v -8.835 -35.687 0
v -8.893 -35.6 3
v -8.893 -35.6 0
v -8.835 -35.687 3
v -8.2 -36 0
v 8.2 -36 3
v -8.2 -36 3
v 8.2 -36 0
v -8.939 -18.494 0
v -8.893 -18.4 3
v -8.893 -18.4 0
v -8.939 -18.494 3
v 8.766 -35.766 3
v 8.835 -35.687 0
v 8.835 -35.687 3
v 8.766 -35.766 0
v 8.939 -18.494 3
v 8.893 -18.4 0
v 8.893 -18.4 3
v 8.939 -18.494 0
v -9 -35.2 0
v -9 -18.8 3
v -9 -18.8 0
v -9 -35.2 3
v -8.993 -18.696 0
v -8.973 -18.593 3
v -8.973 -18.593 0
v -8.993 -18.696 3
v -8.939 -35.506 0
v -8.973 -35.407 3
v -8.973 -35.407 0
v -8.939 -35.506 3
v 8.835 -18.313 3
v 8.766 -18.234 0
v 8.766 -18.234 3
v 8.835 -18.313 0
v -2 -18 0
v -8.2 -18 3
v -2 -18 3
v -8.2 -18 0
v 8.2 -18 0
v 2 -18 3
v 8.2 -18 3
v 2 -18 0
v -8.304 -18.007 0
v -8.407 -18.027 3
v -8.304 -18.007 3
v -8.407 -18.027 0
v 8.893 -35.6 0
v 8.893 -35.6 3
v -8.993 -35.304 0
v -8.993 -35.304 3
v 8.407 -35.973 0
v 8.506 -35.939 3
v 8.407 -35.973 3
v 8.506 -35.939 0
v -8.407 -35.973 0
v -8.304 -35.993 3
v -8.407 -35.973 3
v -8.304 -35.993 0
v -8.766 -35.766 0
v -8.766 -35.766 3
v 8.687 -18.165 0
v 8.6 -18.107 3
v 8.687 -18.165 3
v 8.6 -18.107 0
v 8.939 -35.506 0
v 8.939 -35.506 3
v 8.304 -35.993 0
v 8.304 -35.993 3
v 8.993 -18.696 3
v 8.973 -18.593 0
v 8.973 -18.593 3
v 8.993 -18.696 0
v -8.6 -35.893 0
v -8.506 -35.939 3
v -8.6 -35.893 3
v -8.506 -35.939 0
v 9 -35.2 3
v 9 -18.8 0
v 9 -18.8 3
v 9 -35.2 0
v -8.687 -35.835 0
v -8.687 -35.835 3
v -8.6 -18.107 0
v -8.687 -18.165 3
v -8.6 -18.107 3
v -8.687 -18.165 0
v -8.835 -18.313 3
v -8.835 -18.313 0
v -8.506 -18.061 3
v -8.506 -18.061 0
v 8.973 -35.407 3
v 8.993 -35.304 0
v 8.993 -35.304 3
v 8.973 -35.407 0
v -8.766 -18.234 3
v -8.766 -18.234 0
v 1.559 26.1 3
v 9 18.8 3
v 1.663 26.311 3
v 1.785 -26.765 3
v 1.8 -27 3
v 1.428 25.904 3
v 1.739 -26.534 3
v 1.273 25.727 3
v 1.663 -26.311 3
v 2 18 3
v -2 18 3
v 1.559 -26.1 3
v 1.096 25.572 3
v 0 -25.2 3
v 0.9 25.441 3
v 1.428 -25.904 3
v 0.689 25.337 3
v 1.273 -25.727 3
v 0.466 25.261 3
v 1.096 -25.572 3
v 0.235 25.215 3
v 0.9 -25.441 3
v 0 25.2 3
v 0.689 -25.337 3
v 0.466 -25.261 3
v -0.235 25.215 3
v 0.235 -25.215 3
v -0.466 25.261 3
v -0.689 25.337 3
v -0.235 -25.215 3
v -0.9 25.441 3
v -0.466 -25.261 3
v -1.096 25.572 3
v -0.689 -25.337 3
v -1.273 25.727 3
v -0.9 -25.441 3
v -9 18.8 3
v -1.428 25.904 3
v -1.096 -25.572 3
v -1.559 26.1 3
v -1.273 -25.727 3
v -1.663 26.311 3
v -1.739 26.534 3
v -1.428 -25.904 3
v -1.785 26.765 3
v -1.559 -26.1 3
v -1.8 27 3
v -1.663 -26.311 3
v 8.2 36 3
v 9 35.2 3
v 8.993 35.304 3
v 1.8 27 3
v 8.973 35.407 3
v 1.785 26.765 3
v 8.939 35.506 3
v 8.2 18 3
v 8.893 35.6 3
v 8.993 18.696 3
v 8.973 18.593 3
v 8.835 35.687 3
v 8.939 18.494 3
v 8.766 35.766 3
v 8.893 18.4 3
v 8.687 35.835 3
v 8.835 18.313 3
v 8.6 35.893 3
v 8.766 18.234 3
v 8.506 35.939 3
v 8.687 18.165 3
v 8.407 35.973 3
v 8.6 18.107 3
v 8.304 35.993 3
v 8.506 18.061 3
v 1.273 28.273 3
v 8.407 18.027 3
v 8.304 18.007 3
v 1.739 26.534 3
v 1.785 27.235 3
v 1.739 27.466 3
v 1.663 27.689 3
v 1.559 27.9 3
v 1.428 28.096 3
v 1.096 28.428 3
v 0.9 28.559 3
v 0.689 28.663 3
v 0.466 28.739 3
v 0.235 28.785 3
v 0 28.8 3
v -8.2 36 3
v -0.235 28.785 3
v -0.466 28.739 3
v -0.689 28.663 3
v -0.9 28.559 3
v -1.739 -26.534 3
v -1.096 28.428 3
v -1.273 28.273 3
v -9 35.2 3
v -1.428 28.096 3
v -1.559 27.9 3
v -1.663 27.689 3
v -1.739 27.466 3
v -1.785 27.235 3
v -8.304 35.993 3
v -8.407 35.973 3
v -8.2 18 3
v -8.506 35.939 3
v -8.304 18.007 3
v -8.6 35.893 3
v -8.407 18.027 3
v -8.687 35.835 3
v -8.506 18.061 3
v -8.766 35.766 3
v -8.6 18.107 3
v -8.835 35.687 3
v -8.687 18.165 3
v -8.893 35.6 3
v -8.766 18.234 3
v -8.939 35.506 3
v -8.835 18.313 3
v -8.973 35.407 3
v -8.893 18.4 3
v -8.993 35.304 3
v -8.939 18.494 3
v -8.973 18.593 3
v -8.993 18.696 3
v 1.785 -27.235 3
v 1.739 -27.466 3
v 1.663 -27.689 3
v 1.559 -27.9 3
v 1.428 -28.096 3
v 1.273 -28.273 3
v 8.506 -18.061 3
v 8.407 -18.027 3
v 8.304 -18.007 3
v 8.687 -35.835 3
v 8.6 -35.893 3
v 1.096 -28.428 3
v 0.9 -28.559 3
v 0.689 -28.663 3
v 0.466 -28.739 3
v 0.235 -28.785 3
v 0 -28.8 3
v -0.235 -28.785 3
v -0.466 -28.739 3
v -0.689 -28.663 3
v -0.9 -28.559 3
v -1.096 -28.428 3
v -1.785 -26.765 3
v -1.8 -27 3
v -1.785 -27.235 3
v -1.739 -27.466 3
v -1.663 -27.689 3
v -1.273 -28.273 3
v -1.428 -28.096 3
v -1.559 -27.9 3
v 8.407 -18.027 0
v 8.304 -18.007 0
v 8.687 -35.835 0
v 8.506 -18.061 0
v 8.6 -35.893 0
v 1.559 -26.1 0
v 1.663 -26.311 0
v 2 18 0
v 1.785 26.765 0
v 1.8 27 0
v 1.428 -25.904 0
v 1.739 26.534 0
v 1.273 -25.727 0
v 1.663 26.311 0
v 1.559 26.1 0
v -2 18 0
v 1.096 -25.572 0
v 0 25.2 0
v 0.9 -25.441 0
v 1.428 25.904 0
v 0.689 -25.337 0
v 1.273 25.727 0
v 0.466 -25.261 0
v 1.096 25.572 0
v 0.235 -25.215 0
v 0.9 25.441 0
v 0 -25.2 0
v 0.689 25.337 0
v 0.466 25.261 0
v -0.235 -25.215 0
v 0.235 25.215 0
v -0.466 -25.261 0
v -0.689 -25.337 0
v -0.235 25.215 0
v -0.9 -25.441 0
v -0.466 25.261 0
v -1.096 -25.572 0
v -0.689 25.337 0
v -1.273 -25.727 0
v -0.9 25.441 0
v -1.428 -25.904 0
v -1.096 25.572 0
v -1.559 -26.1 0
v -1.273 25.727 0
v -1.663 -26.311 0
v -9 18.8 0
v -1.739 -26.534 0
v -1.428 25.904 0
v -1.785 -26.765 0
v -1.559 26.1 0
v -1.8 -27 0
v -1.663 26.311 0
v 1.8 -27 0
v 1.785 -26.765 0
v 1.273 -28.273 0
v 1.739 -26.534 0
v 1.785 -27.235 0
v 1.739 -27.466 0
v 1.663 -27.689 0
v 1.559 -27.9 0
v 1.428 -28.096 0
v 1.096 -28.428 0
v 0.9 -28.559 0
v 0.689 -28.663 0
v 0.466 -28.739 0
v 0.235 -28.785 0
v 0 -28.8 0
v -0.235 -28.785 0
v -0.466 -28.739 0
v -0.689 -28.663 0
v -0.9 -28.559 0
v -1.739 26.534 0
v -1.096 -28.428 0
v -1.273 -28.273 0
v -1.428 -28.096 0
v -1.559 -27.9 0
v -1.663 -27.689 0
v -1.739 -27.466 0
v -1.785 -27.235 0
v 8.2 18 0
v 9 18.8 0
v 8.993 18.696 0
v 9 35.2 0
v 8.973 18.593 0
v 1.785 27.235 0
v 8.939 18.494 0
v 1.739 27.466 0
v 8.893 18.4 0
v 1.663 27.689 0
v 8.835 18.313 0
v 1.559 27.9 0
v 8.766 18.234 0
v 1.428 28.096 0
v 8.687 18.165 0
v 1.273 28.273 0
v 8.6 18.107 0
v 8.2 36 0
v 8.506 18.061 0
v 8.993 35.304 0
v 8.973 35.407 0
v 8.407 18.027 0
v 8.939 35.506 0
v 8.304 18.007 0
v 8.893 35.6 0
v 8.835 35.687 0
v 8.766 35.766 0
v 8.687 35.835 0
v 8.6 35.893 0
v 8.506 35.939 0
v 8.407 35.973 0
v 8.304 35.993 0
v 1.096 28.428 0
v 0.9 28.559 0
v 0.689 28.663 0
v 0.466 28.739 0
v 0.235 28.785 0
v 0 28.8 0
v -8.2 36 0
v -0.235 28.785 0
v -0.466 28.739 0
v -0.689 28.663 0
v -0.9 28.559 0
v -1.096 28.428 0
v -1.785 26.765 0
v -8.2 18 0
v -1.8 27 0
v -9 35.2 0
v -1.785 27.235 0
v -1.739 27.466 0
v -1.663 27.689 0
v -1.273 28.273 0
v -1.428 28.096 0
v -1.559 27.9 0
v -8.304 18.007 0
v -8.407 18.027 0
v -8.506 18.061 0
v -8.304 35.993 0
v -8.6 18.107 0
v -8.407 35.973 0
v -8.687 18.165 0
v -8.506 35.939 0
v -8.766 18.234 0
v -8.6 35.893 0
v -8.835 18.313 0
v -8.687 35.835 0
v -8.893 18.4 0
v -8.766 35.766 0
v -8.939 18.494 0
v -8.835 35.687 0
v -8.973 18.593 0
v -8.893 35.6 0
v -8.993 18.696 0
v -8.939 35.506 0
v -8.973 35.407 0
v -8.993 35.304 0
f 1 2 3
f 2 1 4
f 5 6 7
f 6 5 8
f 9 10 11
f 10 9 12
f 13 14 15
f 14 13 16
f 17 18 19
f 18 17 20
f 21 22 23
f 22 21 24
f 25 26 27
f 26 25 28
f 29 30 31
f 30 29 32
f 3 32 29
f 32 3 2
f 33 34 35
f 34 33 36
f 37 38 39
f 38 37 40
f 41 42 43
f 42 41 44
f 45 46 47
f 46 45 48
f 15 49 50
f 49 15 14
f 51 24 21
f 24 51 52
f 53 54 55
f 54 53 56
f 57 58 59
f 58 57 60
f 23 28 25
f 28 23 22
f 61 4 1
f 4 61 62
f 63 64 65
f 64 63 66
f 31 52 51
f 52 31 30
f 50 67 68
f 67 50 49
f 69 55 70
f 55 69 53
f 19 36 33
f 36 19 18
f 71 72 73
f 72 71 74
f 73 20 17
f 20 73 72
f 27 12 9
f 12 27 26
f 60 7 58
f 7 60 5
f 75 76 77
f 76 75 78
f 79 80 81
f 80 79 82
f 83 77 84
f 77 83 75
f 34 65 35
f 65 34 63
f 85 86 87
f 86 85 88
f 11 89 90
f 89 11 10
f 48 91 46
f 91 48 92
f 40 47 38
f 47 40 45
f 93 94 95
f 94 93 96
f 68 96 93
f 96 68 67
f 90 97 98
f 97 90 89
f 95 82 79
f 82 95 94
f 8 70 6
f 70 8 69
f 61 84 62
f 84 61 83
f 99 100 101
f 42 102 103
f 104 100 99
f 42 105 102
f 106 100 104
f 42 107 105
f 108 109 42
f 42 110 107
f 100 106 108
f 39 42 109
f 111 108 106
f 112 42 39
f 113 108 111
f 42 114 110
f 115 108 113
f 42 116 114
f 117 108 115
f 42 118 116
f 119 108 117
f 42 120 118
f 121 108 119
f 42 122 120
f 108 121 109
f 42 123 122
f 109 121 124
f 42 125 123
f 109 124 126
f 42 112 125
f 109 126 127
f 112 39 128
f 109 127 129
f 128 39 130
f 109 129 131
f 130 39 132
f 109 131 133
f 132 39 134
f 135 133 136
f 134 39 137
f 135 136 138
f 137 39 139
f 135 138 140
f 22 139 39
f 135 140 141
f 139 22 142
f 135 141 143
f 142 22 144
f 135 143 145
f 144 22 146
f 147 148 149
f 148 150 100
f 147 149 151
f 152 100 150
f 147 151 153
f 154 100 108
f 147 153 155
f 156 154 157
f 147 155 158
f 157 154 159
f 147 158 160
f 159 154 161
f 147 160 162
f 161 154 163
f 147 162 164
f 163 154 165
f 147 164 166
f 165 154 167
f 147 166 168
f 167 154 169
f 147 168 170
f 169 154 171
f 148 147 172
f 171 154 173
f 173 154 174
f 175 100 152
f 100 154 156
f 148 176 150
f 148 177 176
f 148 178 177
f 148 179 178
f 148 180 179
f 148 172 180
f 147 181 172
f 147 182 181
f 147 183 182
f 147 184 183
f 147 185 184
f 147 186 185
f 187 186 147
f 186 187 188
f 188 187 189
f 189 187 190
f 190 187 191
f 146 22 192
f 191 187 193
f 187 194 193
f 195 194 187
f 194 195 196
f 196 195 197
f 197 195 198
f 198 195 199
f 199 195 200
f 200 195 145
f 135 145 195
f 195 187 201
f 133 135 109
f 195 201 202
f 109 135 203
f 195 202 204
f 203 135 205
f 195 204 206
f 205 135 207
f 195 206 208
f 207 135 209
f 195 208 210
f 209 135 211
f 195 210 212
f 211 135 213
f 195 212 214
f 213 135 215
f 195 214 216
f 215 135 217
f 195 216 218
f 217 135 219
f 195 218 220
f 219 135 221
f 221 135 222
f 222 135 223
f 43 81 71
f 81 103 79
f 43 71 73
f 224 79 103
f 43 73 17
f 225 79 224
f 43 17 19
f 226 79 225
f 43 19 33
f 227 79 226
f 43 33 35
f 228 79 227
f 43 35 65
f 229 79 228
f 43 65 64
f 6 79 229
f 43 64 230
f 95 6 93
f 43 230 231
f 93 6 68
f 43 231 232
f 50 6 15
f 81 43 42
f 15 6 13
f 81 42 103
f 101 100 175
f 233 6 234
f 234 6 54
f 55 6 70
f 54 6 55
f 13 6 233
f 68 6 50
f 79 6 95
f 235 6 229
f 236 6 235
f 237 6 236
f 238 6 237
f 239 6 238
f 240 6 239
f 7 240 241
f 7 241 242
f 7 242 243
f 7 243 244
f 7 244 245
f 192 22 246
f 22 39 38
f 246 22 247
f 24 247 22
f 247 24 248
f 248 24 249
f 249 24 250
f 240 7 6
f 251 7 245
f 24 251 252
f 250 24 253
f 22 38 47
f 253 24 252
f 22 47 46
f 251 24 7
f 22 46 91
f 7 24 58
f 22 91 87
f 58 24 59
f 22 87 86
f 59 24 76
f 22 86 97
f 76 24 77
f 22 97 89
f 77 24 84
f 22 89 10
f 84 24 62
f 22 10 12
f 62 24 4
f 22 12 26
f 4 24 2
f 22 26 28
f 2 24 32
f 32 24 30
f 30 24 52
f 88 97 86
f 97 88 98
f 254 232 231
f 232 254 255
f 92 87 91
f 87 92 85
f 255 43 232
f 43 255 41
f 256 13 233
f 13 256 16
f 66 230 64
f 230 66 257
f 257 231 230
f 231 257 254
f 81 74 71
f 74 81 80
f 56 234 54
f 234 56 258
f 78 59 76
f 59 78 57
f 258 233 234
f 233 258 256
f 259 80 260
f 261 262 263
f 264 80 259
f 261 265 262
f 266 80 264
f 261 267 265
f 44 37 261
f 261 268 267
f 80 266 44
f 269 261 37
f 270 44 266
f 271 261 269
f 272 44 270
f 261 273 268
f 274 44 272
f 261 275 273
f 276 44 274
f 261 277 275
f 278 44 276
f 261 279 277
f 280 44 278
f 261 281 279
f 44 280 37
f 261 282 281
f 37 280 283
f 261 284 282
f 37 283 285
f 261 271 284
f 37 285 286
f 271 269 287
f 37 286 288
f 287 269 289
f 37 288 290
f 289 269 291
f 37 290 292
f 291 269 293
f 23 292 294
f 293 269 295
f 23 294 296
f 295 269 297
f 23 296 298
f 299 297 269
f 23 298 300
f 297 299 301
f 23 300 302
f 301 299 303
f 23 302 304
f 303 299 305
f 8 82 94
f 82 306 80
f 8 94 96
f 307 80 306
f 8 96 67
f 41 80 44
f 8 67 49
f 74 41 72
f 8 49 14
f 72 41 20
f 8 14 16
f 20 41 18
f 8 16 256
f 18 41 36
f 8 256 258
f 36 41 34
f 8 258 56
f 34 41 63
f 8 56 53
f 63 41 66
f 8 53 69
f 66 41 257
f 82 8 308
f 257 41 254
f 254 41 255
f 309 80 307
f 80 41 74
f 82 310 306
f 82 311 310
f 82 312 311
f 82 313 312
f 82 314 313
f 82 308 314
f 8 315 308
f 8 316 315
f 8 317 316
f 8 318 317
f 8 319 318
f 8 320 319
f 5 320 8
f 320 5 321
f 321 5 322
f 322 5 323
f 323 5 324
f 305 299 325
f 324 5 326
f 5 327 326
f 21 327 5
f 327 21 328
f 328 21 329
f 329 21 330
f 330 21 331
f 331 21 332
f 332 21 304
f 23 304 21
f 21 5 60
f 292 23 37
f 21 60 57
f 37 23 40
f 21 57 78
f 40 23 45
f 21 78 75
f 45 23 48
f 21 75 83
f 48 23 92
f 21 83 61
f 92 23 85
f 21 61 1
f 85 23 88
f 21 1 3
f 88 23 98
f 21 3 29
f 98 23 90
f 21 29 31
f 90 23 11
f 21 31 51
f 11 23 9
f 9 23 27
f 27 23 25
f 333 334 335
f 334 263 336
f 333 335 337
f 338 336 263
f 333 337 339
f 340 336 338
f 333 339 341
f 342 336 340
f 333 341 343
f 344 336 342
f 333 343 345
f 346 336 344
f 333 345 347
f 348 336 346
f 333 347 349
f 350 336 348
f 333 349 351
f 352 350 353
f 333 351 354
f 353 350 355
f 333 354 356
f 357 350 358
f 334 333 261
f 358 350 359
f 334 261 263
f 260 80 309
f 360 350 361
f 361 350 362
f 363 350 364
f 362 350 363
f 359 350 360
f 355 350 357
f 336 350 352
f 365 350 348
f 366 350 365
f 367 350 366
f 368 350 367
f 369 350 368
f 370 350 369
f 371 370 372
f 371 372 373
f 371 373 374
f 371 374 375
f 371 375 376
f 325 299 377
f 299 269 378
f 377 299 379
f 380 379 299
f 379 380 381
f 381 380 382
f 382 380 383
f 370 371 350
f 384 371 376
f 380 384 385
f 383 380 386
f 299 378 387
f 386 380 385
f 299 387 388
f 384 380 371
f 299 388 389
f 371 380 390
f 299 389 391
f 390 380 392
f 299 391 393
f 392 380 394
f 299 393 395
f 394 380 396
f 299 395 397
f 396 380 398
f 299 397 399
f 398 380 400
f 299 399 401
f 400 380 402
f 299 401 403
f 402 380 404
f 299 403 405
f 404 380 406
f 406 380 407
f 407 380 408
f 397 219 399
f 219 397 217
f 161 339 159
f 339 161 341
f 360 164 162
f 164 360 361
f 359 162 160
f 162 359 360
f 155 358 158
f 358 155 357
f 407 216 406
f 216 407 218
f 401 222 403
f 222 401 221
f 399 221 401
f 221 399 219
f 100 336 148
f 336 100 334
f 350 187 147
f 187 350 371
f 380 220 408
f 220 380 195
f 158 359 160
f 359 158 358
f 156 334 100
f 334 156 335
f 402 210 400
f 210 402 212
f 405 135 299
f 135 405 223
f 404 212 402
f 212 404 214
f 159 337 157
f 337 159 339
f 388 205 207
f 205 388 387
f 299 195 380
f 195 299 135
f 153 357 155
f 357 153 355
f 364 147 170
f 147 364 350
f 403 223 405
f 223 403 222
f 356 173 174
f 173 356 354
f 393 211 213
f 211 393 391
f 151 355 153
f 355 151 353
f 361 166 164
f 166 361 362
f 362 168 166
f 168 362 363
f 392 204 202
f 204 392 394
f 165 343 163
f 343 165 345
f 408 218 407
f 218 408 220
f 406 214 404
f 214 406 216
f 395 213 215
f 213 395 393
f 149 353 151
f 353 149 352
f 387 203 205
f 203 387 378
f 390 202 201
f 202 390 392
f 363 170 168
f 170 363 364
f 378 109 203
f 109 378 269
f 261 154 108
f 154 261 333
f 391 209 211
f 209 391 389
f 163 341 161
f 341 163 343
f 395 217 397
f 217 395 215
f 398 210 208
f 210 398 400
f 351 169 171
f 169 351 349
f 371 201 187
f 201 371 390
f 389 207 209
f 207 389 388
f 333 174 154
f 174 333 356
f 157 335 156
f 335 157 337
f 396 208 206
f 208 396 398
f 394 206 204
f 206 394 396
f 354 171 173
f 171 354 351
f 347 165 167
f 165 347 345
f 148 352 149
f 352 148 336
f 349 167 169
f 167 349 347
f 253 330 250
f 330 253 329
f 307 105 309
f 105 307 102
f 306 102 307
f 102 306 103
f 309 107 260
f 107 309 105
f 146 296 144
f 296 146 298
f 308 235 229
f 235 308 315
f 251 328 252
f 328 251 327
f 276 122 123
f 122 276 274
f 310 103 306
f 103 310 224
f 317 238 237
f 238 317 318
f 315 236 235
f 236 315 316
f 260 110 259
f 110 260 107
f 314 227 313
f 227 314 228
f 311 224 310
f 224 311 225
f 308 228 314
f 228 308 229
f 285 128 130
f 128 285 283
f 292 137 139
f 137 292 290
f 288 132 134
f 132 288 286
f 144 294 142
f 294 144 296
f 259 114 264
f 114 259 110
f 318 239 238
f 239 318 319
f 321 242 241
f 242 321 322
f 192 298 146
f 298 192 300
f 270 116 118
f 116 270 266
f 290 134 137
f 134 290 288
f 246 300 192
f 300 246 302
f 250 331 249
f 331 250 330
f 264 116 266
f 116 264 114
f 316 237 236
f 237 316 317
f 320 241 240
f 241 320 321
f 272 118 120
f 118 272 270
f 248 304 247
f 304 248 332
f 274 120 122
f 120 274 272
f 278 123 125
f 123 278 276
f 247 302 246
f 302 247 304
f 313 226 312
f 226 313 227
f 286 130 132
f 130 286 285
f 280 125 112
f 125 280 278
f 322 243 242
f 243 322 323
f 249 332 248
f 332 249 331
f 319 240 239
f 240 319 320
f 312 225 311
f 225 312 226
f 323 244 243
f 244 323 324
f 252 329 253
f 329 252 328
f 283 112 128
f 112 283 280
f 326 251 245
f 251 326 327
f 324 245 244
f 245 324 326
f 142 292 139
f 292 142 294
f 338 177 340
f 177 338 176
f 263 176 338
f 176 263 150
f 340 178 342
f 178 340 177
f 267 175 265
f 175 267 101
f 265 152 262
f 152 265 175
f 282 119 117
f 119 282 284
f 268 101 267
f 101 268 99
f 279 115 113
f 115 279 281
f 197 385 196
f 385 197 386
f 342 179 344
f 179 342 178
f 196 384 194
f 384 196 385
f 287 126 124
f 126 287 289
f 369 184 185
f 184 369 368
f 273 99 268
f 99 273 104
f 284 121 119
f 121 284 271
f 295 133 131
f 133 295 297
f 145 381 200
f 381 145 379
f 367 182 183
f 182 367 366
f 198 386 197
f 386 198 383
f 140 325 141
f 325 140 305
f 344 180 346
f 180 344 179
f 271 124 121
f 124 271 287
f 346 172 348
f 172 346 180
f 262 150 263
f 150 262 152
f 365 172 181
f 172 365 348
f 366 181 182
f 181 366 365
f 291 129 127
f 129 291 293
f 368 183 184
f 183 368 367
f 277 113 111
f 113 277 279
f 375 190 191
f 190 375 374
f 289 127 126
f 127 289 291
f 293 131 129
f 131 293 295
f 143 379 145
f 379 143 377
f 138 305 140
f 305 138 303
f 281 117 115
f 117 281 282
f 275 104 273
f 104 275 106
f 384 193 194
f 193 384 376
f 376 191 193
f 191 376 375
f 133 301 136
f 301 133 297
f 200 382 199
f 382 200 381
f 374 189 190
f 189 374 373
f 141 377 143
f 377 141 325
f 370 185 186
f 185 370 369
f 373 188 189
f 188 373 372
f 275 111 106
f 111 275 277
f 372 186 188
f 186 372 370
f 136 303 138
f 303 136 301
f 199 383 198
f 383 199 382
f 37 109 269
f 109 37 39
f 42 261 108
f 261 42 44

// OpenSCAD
// Exact mounting tabs, holes and spacing from the cradle.
include <rack-adapter-locator-cradle.scad>
part = "mounting_coupon";
